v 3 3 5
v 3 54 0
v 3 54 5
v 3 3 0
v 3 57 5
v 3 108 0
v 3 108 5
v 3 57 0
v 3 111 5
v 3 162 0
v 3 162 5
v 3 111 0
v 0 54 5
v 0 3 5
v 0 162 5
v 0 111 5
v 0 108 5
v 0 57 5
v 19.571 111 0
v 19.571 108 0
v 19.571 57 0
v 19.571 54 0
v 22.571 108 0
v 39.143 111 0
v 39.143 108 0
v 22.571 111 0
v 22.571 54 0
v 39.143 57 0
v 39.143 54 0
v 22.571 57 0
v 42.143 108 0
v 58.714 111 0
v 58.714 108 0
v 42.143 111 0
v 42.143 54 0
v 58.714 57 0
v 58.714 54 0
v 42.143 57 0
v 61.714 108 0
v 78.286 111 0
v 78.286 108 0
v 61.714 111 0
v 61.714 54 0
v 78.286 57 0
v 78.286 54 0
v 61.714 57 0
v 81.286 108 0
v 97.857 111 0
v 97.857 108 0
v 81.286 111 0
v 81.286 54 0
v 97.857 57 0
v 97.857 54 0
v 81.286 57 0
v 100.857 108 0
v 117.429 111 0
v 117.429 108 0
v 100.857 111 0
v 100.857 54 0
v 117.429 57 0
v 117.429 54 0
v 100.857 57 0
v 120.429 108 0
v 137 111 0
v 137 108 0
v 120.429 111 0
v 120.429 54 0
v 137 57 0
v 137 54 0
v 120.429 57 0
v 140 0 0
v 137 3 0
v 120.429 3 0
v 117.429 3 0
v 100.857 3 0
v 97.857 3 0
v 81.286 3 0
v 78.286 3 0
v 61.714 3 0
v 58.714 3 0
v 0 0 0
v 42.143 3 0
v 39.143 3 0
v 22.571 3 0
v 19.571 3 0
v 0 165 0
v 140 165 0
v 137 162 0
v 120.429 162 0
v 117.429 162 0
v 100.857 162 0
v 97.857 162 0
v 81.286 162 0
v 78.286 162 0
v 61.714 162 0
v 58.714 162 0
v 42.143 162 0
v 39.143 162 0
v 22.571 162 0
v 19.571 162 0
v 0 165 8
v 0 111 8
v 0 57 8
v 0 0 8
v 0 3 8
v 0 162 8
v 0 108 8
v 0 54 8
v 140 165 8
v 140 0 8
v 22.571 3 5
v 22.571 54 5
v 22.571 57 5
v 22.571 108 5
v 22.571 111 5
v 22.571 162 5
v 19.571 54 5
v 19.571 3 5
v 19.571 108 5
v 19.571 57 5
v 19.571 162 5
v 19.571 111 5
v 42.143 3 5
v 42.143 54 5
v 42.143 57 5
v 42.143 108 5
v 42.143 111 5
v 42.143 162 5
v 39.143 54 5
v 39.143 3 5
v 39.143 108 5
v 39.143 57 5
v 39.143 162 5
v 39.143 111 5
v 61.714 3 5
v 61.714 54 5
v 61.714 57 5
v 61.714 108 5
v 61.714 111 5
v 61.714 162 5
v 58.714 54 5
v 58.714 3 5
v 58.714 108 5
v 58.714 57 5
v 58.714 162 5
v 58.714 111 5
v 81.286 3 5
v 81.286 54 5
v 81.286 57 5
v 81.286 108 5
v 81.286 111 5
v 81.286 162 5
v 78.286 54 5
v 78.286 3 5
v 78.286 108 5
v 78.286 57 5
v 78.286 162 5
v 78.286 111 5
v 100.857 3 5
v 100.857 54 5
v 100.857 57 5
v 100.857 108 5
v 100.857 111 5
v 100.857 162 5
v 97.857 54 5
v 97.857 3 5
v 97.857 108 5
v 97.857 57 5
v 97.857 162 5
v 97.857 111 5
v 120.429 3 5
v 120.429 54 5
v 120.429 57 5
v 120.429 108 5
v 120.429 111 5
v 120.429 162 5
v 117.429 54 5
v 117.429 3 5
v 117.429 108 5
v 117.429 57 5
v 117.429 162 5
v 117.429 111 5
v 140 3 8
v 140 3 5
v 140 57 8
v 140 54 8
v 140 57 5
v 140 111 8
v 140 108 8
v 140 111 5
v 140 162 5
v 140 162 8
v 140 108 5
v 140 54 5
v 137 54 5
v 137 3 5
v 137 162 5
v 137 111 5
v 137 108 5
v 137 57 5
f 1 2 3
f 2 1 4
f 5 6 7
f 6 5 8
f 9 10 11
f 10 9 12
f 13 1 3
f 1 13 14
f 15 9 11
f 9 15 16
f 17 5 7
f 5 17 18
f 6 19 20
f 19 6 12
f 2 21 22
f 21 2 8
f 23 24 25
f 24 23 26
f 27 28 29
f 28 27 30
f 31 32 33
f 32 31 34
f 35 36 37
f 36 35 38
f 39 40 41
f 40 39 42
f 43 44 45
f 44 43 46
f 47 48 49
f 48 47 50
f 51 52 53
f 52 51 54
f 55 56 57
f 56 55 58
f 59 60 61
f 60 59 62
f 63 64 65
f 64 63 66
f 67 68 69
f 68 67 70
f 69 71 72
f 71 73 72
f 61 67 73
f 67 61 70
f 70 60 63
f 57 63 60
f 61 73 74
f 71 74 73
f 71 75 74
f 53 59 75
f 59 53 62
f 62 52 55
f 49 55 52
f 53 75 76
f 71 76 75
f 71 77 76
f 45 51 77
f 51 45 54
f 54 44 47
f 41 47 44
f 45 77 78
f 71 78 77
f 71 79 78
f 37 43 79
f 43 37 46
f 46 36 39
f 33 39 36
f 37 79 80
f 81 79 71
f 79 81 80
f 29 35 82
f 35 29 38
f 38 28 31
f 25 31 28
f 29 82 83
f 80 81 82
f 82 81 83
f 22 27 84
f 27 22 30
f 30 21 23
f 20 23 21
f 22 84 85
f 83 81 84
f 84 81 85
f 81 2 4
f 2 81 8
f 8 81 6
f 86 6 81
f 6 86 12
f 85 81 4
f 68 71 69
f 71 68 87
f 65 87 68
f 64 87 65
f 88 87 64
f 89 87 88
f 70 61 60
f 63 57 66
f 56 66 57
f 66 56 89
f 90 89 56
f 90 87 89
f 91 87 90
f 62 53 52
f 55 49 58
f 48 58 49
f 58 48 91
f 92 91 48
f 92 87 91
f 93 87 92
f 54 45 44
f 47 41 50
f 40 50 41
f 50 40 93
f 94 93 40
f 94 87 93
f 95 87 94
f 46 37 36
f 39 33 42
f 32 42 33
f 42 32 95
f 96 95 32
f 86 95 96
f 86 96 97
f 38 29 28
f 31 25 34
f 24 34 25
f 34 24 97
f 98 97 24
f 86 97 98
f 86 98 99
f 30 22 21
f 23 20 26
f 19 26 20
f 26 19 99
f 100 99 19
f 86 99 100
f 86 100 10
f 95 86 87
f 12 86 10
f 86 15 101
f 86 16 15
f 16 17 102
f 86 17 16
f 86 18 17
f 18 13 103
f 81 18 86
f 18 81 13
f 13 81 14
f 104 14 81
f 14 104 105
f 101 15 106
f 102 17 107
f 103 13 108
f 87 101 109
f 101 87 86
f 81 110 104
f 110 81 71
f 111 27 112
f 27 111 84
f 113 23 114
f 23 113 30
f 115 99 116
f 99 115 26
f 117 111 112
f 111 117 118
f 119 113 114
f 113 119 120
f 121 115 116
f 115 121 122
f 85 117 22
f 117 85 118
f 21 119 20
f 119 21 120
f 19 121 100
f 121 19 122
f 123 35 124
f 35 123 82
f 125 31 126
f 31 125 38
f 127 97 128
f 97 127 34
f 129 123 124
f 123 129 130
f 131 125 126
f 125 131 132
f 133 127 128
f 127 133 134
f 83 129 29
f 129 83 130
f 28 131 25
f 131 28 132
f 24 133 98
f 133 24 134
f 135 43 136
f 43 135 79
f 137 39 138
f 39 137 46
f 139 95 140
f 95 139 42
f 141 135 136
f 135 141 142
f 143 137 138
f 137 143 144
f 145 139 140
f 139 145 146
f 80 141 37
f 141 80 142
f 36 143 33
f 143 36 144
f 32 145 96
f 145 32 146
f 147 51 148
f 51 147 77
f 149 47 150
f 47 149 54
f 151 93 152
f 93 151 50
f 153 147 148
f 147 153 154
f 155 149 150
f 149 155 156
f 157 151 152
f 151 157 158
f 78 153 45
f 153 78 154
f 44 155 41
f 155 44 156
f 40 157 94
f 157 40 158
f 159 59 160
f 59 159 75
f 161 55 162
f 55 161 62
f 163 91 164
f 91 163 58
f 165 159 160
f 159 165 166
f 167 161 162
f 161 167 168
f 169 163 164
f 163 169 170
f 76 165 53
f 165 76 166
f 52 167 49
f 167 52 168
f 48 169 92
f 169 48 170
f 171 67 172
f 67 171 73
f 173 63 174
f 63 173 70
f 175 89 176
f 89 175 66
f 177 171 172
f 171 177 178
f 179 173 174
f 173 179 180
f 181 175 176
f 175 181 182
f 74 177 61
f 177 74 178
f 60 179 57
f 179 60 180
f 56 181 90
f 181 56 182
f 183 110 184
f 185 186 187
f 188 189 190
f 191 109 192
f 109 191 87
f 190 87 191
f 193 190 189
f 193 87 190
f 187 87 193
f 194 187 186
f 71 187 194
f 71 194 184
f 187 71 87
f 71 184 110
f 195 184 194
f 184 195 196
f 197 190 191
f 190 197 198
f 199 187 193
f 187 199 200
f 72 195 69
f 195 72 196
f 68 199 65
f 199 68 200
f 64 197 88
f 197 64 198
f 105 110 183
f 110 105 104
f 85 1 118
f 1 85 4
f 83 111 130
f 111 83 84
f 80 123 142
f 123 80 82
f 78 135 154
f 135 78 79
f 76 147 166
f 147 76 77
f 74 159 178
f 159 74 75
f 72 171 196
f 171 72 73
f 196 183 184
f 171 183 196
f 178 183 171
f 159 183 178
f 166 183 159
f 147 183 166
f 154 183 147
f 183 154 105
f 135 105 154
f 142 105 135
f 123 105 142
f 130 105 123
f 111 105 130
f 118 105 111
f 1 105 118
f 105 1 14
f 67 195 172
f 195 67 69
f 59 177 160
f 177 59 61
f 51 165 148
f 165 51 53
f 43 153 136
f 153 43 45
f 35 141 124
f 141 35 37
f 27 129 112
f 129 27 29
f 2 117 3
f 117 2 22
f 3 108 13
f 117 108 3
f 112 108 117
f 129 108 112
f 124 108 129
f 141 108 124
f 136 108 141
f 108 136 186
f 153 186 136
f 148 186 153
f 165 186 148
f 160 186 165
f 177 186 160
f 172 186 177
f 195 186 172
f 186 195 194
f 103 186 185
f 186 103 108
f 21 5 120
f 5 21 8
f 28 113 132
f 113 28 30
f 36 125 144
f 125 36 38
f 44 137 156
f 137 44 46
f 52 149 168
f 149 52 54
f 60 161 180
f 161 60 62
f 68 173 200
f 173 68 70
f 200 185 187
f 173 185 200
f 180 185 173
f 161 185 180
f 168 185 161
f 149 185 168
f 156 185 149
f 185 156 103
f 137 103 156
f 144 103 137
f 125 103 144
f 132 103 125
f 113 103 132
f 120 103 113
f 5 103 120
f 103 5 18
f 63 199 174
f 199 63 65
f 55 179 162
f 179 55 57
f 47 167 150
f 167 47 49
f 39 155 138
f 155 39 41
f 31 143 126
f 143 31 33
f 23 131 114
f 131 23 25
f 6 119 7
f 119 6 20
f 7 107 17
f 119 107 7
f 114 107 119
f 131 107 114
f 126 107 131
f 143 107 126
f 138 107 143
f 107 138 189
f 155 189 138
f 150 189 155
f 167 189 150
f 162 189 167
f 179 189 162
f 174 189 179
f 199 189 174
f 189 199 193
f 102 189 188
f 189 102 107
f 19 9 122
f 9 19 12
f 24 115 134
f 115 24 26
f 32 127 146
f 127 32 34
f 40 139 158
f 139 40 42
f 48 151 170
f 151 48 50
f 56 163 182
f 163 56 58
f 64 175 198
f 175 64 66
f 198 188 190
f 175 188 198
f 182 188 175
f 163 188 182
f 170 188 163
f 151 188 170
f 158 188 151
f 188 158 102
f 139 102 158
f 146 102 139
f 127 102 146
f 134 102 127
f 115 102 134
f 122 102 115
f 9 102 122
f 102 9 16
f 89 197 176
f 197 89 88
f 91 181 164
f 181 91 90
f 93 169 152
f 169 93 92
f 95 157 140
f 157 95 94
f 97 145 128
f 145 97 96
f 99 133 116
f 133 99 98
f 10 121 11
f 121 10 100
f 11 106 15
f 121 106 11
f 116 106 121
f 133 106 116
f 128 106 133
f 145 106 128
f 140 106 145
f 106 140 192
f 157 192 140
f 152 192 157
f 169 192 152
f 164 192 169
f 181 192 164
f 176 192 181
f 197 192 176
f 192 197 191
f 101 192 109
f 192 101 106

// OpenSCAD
// Short shelf for annoying fridge drawer that takes on water

module grid(lenx=140, nx=8, leny=165, ny=4) {
  width = 3;
  height = 5;
  
  for (i = [0 : nx - 1]) {
    translate([(lenx - width) * i / (nx - 1), 0, 0])
      cube([width, leny, height]);
  }
  
  for (i = [0 : ny - 1]) {
    translate([0, width + (leny - width) * i / (ny - 1), 0])
      rotate([0, 0, -90])
        cube([width, lenx, height+3]);
  }
}

grid();
